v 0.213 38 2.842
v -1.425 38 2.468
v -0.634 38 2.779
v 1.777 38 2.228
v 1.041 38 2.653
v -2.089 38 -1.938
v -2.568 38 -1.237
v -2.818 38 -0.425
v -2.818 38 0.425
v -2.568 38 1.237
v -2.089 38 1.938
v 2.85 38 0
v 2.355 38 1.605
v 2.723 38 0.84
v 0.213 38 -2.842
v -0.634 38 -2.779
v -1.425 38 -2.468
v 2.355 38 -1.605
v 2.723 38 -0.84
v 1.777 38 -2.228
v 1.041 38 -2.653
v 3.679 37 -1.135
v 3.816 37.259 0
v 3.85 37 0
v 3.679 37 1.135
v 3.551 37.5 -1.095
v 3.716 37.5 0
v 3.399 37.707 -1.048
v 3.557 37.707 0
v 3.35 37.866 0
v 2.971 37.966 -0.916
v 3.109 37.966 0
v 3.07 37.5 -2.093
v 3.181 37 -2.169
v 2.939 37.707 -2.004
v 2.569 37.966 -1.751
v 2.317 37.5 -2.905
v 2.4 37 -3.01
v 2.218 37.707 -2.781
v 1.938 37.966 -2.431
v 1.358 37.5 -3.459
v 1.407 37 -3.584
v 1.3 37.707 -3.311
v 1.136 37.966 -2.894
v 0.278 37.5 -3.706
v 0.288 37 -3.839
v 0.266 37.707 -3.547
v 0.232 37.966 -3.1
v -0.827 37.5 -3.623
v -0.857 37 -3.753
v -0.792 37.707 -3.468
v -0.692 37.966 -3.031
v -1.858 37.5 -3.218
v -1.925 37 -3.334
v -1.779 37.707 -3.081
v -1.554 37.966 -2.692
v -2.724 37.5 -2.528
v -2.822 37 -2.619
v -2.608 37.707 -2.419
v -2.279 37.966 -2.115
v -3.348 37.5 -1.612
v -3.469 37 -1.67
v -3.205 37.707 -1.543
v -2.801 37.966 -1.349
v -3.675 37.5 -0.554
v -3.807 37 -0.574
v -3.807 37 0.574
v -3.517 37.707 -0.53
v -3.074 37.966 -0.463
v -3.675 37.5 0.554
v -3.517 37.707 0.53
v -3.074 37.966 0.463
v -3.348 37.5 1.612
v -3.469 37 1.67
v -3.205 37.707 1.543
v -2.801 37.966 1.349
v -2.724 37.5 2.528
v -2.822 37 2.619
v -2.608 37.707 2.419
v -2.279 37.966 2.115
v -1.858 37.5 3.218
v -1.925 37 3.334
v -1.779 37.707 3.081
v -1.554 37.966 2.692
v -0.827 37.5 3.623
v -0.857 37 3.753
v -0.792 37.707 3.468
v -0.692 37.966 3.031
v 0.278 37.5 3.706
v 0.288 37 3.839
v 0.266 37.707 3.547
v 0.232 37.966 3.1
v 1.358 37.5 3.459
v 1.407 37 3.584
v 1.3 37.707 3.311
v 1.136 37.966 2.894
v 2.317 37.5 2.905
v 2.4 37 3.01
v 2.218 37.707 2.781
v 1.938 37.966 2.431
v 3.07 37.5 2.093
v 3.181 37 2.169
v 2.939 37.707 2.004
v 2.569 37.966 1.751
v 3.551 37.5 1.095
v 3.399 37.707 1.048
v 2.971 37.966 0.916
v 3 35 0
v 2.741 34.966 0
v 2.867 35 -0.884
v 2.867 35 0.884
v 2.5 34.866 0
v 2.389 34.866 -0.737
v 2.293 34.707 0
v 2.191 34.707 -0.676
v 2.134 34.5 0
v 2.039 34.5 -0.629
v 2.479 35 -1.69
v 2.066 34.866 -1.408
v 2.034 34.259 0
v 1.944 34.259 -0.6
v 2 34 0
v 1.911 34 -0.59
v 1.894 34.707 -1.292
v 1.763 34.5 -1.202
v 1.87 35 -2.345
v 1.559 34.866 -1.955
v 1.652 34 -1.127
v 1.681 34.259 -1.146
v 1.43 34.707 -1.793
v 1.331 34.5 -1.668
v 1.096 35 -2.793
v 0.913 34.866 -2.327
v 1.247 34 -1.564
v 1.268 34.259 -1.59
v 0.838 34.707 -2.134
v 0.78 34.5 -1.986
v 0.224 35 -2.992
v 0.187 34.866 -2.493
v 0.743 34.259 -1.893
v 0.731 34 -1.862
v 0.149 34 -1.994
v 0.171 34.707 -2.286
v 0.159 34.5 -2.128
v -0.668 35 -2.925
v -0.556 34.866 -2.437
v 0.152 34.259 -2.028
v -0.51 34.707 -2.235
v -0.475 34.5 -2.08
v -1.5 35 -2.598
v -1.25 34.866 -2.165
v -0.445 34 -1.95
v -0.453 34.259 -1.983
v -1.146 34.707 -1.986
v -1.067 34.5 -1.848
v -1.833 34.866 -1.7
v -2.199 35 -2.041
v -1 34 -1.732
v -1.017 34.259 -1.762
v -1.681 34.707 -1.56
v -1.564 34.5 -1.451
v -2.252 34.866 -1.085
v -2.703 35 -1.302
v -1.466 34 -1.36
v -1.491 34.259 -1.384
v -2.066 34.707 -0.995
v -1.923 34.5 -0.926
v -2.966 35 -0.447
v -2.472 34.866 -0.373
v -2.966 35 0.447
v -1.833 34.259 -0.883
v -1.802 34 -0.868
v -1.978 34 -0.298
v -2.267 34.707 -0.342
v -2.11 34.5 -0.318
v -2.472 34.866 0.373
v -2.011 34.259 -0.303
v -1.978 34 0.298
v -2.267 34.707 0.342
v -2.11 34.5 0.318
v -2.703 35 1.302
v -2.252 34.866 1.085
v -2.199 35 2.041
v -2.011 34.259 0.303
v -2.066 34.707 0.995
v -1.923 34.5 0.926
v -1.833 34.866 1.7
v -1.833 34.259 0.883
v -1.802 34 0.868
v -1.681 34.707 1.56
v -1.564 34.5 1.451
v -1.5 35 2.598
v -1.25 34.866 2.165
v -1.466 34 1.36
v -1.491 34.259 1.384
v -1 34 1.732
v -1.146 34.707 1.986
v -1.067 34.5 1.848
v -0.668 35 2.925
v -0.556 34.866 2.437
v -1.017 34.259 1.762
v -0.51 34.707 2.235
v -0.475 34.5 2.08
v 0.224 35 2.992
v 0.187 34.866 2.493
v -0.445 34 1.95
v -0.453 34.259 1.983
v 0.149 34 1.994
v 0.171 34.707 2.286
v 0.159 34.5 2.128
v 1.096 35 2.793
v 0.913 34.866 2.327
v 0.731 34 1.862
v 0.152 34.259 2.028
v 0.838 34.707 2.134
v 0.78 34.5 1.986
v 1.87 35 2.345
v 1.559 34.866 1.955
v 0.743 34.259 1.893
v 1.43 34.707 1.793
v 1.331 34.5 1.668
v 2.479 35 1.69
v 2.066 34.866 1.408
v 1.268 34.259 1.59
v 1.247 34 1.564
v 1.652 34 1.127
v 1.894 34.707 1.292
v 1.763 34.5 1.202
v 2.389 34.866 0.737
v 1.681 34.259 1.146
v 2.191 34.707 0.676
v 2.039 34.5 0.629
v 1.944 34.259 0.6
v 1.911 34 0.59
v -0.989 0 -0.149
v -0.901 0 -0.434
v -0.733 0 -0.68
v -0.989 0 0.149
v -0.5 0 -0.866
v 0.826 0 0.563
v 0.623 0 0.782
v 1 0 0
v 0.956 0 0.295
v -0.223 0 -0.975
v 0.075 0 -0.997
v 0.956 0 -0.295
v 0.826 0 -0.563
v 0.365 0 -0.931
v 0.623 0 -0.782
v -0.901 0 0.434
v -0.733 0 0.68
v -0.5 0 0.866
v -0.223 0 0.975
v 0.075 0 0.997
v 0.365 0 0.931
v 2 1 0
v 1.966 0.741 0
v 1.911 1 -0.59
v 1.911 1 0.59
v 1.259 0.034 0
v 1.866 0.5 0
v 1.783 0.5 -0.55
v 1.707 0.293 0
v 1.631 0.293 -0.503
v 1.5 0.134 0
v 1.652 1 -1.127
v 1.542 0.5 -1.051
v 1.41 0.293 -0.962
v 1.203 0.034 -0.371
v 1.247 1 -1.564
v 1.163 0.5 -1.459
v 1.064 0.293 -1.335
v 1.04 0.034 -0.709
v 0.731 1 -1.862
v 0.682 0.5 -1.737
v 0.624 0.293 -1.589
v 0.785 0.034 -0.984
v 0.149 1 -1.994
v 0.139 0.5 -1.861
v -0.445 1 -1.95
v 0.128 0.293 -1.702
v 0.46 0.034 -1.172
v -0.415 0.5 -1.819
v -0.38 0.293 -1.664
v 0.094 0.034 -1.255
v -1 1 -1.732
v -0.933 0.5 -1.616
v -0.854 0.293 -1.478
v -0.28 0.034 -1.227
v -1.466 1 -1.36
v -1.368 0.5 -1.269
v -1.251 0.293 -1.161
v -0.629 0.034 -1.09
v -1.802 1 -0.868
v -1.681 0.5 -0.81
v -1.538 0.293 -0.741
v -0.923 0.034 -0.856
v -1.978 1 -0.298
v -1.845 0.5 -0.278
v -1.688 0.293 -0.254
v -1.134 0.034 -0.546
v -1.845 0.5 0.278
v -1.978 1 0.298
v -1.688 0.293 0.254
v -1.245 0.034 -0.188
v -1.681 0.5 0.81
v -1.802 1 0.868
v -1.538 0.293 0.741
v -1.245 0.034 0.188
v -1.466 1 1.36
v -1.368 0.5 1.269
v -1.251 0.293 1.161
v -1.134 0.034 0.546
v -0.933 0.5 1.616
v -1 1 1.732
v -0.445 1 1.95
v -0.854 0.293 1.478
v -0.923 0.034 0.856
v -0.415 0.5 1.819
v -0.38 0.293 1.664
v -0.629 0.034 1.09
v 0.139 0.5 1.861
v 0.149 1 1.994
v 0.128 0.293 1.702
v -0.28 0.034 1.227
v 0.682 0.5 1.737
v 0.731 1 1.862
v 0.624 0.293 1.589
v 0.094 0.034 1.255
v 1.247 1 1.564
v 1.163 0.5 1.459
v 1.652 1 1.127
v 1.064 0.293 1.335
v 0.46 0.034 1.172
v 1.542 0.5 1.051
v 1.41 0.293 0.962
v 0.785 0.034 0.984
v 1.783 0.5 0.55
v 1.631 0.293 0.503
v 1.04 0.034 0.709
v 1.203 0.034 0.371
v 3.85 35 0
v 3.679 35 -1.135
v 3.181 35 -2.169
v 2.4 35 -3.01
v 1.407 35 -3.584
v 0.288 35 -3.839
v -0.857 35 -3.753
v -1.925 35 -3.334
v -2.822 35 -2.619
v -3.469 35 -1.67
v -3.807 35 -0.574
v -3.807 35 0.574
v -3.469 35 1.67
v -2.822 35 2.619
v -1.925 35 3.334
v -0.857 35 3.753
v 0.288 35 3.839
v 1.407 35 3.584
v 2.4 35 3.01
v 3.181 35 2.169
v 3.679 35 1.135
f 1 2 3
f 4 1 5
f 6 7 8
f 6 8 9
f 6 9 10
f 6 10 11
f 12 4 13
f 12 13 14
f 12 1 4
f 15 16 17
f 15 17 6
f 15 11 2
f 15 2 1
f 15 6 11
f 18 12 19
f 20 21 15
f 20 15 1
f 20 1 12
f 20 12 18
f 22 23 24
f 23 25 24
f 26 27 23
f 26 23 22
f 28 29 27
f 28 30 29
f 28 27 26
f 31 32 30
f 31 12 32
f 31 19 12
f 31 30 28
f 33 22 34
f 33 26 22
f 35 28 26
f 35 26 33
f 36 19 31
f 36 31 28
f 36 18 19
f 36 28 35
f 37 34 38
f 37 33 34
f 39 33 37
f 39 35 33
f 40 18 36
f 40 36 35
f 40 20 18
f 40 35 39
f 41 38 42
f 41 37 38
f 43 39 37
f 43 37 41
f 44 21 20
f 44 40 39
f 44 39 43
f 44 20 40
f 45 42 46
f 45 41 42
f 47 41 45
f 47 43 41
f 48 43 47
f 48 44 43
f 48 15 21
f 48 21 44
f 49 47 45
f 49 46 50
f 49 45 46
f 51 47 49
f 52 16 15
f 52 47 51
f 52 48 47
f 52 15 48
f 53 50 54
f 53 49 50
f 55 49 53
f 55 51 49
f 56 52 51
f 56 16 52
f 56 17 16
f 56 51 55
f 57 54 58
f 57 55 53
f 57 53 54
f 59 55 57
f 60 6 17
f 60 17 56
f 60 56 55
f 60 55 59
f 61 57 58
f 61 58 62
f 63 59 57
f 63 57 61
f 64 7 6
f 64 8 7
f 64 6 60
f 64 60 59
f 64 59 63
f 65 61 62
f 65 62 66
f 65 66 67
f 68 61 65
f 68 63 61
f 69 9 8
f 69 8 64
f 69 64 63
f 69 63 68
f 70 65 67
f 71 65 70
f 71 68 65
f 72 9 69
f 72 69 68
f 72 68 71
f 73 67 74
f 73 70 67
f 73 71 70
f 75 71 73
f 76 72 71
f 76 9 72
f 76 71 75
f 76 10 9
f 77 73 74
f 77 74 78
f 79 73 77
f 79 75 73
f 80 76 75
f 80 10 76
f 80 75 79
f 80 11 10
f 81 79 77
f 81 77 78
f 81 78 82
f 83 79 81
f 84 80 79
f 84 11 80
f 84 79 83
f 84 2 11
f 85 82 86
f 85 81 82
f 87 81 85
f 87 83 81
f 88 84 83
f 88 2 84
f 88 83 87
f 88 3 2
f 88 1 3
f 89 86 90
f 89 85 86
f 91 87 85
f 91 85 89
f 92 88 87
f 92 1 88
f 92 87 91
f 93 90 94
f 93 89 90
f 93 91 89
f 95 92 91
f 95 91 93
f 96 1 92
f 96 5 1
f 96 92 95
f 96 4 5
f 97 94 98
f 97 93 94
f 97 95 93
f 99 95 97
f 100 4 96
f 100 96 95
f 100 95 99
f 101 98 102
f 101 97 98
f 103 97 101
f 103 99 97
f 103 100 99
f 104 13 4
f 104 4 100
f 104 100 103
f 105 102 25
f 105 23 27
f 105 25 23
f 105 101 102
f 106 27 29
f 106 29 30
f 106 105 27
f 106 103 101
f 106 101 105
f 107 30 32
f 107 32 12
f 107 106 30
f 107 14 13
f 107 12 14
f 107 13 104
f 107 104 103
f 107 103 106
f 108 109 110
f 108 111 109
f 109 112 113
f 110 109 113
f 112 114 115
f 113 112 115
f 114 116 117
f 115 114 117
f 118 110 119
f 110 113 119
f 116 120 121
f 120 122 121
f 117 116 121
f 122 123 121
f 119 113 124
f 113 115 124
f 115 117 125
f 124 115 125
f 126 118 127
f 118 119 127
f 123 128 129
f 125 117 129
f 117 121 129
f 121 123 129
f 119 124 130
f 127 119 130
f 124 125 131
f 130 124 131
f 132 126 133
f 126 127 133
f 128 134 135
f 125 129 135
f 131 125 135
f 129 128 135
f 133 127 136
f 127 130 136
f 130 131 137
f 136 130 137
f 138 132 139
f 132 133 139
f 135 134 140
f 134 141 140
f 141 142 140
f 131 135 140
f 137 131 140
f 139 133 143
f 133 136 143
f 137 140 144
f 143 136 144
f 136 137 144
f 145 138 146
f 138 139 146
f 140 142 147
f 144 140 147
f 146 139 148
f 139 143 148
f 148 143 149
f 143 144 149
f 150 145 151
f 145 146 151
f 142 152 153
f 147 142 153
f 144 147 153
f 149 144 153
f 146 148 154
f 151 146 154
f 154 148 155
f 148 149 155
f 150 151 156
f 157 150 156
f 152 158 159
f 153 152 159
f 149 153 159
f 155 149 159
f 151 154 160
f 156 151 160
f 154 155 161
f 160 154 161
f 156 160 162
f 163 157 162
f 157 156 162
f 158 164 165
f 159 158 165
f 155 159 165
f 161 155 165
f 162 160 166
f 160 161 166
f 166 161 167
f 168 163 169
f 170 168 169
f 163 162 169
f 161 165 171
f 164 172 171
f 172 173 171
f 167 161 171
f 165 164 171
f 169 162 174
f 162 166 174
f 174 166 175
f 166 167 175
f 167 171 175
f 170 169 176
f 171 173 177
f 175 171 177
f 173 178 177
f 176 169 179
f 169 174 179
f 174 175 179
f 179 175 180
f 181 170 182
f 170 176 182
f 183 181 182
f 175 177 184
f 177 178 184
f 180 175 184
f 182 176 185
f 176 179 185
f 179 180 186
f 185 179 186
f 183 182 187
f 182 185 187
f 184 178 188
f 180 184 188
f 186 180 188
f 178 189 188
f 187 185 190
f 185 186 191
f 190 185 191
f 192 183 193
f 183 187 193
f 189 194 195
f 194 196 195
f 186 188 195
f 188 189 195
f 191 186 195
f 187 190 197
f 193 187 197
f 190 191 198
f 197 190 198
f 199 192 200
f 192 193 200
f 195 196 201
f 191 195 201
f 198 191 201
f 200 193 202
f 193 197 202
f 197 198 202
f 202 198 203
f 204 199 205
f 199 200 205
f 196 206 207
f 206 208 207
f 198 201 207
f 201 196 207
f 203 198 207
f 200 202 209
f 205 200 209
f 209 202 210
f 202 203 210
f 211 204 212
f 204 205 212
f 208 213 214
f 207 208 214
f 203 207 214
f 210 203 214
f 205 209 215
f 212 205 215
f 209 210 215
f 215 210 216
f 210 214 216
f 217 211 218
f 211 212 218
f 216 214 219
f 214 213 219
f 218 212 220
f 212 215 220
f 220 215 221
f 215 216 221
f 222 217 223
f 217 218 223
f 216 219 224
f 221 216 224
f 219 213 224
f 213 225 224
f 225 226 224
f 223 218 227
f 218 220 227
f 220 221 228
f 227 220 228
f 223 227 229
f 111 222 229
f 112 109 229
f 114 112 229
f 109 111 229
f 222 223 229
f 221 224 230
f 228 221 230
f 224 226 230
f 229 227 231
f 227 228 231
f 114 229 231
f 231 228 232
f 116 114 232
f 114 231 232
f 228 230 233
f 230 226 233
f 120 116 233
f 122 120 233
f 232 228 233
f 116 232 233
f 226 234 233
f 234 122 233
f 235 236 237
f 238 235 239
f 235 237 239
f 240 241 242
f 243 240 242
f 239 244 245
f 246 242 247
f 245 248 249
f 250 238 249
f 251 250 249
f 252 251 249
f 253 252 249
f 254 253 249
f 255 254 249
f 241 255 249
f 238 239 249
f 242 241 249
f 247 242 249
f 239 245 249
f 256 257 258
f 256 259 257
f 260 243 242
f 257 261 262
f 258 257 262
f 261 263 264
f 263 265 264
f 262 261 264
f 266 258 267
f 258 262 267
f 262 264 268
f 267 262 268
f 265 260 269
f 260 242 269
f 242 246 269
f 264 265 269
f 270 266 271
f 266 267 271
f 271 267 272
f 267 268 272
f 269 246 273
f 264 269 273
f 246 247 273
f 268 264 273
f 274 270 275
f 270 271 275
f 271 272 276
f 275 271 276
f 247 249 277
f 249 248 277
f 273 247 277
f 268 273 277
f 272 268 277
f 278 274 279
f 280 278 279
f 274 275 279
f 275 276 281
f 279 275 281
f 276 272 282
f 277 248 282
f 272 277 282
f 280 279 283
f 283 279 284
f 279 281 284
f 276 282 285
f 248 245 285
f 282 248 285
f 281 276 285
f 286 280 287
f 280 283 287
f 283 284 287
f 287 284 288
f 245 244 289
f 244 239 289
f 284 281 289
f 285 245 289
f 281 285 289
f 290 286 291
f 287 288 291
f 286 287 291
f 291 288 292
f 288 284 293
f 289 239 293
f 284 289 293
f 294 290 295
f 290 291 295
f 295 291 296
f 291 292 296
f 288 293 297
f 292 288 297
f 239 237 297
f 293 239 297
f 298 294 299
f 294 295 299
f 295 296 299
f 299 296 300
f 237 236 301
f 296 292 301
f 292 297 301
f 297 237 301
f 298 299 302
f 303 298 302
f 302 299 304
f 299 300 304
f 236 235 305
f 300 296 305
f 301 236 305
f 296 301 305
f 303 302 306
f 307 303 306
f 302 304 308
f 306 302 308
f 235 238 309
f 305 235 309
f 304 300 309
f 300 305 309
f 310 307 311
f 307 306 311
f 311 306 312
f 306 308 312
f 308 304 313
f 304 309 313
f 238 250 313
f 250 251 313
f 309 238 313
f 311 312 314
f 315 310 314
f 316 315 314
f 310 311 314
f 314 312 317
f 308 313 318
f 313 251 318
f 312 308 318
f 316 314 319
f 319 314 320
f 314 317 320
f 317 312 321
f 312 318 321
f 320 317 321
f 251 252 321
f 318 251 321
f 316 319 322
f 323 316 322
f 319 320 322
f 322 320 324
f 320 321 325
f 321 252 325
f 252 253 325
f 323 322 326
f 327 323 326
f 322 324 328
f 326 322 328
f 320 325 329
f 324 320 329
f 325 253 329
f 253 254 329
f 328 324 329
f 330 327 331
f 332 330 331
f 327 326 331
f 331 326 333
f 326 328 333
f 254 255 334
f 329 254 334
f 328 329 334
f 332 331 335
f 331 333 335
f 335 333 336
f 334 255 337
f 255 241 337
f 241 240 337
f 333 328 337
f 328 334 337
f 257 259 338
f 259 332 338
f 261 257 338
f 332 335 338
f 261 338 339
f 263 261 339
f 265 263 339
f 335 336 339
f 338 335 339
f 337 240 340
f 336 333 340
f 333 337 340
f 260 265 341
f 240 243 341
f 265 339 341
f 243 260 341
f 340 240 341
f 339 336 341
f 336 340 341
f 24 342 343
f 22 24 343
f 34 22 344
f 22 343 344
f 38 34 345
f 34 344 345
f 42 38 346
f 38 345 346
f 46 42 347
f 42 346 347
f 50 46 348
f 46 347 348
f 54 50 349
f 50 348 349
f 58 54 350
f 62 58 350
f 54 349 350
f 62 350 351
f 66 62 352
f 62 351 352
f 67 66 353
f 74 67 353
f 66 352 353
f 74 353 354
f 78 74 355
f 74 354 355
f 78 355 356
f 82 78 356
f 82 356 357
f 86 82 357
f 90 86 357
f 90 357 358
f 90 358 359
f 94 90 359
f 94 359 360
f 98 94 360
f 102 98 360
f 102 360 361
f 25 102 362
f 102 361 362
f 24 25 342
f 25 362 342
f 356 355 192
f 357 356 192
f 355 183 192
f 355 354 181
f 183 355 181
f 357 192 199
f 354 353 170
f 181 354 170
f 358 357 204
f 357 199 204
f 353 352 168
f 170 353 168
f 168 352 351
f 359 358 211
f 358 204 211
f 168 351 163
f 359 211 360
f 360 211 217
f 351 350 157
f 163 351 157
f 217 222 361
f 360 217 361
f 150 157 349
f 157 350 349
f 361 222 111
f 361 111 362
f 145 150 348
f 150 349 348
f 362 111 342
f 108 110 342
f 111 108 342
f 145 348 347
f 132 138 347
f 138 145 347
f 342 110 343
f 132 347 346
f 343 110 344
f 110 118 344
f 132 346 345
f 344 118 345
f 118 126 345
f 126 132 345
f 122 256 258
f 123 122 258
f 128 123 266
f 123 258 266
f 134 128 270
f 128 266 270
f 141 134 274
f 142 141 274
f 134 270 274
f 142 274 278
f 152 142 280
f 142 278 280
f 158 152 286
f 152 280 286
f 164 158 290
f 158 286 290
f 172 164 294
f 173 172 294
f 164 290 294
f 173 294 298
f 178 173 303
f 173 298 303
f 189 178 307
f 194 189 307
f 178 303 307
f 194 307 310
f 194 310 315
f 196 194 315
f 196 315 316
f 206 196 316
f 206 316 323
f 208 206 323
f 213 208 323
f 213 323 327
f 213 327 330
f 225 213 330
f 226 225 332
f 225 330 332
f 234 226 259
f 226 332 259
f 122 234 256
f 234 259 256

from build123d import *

# Parameters (mm, degrees)
SKETCH1_R           = 2
BOSS_EXTRUDE1_DEPTH = 35
SKETCH2_R           = 3.85
BOSS_EXTRUDE2_DEPTH = 3
FILLET1_R           = 1
FILLET2_R           = 1


with BuildPart() as part:
    # Sketch1 → Boss-Extrude1 (new body)
    with BuildSketch(Plane(origin=(0, 0, 0), x_dir=(1, 0, 0), z_dir=(0, 1, 0))):
        Circle(SKETCH1_R)
    extrude(amount=BOSS_EXTRUDE1_DEPTH)

    # Sketch2 → Boss-Extrude2 (add)
    with BuildSketch(Plane(origin=(0, 35, 0), x_dir=(1, 0, 0), z_dir=(0, 1, 0))):
        Circle(SKETCH2_R)
    extrude(amount=BOSS_EXTRUDE2_DEPTH)

    # Fillet1
    fillet1_edges = [part.edges().sort_by_distance(p)[0] for p in [
        (-3.85, 38, 0),
    ]]
    fillet(fillet1_edges, radius=FILLET1_R)

    # Fillet2
    fillet2_edges = [part.edges().sort_by_distance(p)[0] for p in [
        (-2, 0, 0),
        (-2, 35, 0),
    ]]
    fillet(fillet2_edges, radius=FILLET2_R)


solid = part.part
